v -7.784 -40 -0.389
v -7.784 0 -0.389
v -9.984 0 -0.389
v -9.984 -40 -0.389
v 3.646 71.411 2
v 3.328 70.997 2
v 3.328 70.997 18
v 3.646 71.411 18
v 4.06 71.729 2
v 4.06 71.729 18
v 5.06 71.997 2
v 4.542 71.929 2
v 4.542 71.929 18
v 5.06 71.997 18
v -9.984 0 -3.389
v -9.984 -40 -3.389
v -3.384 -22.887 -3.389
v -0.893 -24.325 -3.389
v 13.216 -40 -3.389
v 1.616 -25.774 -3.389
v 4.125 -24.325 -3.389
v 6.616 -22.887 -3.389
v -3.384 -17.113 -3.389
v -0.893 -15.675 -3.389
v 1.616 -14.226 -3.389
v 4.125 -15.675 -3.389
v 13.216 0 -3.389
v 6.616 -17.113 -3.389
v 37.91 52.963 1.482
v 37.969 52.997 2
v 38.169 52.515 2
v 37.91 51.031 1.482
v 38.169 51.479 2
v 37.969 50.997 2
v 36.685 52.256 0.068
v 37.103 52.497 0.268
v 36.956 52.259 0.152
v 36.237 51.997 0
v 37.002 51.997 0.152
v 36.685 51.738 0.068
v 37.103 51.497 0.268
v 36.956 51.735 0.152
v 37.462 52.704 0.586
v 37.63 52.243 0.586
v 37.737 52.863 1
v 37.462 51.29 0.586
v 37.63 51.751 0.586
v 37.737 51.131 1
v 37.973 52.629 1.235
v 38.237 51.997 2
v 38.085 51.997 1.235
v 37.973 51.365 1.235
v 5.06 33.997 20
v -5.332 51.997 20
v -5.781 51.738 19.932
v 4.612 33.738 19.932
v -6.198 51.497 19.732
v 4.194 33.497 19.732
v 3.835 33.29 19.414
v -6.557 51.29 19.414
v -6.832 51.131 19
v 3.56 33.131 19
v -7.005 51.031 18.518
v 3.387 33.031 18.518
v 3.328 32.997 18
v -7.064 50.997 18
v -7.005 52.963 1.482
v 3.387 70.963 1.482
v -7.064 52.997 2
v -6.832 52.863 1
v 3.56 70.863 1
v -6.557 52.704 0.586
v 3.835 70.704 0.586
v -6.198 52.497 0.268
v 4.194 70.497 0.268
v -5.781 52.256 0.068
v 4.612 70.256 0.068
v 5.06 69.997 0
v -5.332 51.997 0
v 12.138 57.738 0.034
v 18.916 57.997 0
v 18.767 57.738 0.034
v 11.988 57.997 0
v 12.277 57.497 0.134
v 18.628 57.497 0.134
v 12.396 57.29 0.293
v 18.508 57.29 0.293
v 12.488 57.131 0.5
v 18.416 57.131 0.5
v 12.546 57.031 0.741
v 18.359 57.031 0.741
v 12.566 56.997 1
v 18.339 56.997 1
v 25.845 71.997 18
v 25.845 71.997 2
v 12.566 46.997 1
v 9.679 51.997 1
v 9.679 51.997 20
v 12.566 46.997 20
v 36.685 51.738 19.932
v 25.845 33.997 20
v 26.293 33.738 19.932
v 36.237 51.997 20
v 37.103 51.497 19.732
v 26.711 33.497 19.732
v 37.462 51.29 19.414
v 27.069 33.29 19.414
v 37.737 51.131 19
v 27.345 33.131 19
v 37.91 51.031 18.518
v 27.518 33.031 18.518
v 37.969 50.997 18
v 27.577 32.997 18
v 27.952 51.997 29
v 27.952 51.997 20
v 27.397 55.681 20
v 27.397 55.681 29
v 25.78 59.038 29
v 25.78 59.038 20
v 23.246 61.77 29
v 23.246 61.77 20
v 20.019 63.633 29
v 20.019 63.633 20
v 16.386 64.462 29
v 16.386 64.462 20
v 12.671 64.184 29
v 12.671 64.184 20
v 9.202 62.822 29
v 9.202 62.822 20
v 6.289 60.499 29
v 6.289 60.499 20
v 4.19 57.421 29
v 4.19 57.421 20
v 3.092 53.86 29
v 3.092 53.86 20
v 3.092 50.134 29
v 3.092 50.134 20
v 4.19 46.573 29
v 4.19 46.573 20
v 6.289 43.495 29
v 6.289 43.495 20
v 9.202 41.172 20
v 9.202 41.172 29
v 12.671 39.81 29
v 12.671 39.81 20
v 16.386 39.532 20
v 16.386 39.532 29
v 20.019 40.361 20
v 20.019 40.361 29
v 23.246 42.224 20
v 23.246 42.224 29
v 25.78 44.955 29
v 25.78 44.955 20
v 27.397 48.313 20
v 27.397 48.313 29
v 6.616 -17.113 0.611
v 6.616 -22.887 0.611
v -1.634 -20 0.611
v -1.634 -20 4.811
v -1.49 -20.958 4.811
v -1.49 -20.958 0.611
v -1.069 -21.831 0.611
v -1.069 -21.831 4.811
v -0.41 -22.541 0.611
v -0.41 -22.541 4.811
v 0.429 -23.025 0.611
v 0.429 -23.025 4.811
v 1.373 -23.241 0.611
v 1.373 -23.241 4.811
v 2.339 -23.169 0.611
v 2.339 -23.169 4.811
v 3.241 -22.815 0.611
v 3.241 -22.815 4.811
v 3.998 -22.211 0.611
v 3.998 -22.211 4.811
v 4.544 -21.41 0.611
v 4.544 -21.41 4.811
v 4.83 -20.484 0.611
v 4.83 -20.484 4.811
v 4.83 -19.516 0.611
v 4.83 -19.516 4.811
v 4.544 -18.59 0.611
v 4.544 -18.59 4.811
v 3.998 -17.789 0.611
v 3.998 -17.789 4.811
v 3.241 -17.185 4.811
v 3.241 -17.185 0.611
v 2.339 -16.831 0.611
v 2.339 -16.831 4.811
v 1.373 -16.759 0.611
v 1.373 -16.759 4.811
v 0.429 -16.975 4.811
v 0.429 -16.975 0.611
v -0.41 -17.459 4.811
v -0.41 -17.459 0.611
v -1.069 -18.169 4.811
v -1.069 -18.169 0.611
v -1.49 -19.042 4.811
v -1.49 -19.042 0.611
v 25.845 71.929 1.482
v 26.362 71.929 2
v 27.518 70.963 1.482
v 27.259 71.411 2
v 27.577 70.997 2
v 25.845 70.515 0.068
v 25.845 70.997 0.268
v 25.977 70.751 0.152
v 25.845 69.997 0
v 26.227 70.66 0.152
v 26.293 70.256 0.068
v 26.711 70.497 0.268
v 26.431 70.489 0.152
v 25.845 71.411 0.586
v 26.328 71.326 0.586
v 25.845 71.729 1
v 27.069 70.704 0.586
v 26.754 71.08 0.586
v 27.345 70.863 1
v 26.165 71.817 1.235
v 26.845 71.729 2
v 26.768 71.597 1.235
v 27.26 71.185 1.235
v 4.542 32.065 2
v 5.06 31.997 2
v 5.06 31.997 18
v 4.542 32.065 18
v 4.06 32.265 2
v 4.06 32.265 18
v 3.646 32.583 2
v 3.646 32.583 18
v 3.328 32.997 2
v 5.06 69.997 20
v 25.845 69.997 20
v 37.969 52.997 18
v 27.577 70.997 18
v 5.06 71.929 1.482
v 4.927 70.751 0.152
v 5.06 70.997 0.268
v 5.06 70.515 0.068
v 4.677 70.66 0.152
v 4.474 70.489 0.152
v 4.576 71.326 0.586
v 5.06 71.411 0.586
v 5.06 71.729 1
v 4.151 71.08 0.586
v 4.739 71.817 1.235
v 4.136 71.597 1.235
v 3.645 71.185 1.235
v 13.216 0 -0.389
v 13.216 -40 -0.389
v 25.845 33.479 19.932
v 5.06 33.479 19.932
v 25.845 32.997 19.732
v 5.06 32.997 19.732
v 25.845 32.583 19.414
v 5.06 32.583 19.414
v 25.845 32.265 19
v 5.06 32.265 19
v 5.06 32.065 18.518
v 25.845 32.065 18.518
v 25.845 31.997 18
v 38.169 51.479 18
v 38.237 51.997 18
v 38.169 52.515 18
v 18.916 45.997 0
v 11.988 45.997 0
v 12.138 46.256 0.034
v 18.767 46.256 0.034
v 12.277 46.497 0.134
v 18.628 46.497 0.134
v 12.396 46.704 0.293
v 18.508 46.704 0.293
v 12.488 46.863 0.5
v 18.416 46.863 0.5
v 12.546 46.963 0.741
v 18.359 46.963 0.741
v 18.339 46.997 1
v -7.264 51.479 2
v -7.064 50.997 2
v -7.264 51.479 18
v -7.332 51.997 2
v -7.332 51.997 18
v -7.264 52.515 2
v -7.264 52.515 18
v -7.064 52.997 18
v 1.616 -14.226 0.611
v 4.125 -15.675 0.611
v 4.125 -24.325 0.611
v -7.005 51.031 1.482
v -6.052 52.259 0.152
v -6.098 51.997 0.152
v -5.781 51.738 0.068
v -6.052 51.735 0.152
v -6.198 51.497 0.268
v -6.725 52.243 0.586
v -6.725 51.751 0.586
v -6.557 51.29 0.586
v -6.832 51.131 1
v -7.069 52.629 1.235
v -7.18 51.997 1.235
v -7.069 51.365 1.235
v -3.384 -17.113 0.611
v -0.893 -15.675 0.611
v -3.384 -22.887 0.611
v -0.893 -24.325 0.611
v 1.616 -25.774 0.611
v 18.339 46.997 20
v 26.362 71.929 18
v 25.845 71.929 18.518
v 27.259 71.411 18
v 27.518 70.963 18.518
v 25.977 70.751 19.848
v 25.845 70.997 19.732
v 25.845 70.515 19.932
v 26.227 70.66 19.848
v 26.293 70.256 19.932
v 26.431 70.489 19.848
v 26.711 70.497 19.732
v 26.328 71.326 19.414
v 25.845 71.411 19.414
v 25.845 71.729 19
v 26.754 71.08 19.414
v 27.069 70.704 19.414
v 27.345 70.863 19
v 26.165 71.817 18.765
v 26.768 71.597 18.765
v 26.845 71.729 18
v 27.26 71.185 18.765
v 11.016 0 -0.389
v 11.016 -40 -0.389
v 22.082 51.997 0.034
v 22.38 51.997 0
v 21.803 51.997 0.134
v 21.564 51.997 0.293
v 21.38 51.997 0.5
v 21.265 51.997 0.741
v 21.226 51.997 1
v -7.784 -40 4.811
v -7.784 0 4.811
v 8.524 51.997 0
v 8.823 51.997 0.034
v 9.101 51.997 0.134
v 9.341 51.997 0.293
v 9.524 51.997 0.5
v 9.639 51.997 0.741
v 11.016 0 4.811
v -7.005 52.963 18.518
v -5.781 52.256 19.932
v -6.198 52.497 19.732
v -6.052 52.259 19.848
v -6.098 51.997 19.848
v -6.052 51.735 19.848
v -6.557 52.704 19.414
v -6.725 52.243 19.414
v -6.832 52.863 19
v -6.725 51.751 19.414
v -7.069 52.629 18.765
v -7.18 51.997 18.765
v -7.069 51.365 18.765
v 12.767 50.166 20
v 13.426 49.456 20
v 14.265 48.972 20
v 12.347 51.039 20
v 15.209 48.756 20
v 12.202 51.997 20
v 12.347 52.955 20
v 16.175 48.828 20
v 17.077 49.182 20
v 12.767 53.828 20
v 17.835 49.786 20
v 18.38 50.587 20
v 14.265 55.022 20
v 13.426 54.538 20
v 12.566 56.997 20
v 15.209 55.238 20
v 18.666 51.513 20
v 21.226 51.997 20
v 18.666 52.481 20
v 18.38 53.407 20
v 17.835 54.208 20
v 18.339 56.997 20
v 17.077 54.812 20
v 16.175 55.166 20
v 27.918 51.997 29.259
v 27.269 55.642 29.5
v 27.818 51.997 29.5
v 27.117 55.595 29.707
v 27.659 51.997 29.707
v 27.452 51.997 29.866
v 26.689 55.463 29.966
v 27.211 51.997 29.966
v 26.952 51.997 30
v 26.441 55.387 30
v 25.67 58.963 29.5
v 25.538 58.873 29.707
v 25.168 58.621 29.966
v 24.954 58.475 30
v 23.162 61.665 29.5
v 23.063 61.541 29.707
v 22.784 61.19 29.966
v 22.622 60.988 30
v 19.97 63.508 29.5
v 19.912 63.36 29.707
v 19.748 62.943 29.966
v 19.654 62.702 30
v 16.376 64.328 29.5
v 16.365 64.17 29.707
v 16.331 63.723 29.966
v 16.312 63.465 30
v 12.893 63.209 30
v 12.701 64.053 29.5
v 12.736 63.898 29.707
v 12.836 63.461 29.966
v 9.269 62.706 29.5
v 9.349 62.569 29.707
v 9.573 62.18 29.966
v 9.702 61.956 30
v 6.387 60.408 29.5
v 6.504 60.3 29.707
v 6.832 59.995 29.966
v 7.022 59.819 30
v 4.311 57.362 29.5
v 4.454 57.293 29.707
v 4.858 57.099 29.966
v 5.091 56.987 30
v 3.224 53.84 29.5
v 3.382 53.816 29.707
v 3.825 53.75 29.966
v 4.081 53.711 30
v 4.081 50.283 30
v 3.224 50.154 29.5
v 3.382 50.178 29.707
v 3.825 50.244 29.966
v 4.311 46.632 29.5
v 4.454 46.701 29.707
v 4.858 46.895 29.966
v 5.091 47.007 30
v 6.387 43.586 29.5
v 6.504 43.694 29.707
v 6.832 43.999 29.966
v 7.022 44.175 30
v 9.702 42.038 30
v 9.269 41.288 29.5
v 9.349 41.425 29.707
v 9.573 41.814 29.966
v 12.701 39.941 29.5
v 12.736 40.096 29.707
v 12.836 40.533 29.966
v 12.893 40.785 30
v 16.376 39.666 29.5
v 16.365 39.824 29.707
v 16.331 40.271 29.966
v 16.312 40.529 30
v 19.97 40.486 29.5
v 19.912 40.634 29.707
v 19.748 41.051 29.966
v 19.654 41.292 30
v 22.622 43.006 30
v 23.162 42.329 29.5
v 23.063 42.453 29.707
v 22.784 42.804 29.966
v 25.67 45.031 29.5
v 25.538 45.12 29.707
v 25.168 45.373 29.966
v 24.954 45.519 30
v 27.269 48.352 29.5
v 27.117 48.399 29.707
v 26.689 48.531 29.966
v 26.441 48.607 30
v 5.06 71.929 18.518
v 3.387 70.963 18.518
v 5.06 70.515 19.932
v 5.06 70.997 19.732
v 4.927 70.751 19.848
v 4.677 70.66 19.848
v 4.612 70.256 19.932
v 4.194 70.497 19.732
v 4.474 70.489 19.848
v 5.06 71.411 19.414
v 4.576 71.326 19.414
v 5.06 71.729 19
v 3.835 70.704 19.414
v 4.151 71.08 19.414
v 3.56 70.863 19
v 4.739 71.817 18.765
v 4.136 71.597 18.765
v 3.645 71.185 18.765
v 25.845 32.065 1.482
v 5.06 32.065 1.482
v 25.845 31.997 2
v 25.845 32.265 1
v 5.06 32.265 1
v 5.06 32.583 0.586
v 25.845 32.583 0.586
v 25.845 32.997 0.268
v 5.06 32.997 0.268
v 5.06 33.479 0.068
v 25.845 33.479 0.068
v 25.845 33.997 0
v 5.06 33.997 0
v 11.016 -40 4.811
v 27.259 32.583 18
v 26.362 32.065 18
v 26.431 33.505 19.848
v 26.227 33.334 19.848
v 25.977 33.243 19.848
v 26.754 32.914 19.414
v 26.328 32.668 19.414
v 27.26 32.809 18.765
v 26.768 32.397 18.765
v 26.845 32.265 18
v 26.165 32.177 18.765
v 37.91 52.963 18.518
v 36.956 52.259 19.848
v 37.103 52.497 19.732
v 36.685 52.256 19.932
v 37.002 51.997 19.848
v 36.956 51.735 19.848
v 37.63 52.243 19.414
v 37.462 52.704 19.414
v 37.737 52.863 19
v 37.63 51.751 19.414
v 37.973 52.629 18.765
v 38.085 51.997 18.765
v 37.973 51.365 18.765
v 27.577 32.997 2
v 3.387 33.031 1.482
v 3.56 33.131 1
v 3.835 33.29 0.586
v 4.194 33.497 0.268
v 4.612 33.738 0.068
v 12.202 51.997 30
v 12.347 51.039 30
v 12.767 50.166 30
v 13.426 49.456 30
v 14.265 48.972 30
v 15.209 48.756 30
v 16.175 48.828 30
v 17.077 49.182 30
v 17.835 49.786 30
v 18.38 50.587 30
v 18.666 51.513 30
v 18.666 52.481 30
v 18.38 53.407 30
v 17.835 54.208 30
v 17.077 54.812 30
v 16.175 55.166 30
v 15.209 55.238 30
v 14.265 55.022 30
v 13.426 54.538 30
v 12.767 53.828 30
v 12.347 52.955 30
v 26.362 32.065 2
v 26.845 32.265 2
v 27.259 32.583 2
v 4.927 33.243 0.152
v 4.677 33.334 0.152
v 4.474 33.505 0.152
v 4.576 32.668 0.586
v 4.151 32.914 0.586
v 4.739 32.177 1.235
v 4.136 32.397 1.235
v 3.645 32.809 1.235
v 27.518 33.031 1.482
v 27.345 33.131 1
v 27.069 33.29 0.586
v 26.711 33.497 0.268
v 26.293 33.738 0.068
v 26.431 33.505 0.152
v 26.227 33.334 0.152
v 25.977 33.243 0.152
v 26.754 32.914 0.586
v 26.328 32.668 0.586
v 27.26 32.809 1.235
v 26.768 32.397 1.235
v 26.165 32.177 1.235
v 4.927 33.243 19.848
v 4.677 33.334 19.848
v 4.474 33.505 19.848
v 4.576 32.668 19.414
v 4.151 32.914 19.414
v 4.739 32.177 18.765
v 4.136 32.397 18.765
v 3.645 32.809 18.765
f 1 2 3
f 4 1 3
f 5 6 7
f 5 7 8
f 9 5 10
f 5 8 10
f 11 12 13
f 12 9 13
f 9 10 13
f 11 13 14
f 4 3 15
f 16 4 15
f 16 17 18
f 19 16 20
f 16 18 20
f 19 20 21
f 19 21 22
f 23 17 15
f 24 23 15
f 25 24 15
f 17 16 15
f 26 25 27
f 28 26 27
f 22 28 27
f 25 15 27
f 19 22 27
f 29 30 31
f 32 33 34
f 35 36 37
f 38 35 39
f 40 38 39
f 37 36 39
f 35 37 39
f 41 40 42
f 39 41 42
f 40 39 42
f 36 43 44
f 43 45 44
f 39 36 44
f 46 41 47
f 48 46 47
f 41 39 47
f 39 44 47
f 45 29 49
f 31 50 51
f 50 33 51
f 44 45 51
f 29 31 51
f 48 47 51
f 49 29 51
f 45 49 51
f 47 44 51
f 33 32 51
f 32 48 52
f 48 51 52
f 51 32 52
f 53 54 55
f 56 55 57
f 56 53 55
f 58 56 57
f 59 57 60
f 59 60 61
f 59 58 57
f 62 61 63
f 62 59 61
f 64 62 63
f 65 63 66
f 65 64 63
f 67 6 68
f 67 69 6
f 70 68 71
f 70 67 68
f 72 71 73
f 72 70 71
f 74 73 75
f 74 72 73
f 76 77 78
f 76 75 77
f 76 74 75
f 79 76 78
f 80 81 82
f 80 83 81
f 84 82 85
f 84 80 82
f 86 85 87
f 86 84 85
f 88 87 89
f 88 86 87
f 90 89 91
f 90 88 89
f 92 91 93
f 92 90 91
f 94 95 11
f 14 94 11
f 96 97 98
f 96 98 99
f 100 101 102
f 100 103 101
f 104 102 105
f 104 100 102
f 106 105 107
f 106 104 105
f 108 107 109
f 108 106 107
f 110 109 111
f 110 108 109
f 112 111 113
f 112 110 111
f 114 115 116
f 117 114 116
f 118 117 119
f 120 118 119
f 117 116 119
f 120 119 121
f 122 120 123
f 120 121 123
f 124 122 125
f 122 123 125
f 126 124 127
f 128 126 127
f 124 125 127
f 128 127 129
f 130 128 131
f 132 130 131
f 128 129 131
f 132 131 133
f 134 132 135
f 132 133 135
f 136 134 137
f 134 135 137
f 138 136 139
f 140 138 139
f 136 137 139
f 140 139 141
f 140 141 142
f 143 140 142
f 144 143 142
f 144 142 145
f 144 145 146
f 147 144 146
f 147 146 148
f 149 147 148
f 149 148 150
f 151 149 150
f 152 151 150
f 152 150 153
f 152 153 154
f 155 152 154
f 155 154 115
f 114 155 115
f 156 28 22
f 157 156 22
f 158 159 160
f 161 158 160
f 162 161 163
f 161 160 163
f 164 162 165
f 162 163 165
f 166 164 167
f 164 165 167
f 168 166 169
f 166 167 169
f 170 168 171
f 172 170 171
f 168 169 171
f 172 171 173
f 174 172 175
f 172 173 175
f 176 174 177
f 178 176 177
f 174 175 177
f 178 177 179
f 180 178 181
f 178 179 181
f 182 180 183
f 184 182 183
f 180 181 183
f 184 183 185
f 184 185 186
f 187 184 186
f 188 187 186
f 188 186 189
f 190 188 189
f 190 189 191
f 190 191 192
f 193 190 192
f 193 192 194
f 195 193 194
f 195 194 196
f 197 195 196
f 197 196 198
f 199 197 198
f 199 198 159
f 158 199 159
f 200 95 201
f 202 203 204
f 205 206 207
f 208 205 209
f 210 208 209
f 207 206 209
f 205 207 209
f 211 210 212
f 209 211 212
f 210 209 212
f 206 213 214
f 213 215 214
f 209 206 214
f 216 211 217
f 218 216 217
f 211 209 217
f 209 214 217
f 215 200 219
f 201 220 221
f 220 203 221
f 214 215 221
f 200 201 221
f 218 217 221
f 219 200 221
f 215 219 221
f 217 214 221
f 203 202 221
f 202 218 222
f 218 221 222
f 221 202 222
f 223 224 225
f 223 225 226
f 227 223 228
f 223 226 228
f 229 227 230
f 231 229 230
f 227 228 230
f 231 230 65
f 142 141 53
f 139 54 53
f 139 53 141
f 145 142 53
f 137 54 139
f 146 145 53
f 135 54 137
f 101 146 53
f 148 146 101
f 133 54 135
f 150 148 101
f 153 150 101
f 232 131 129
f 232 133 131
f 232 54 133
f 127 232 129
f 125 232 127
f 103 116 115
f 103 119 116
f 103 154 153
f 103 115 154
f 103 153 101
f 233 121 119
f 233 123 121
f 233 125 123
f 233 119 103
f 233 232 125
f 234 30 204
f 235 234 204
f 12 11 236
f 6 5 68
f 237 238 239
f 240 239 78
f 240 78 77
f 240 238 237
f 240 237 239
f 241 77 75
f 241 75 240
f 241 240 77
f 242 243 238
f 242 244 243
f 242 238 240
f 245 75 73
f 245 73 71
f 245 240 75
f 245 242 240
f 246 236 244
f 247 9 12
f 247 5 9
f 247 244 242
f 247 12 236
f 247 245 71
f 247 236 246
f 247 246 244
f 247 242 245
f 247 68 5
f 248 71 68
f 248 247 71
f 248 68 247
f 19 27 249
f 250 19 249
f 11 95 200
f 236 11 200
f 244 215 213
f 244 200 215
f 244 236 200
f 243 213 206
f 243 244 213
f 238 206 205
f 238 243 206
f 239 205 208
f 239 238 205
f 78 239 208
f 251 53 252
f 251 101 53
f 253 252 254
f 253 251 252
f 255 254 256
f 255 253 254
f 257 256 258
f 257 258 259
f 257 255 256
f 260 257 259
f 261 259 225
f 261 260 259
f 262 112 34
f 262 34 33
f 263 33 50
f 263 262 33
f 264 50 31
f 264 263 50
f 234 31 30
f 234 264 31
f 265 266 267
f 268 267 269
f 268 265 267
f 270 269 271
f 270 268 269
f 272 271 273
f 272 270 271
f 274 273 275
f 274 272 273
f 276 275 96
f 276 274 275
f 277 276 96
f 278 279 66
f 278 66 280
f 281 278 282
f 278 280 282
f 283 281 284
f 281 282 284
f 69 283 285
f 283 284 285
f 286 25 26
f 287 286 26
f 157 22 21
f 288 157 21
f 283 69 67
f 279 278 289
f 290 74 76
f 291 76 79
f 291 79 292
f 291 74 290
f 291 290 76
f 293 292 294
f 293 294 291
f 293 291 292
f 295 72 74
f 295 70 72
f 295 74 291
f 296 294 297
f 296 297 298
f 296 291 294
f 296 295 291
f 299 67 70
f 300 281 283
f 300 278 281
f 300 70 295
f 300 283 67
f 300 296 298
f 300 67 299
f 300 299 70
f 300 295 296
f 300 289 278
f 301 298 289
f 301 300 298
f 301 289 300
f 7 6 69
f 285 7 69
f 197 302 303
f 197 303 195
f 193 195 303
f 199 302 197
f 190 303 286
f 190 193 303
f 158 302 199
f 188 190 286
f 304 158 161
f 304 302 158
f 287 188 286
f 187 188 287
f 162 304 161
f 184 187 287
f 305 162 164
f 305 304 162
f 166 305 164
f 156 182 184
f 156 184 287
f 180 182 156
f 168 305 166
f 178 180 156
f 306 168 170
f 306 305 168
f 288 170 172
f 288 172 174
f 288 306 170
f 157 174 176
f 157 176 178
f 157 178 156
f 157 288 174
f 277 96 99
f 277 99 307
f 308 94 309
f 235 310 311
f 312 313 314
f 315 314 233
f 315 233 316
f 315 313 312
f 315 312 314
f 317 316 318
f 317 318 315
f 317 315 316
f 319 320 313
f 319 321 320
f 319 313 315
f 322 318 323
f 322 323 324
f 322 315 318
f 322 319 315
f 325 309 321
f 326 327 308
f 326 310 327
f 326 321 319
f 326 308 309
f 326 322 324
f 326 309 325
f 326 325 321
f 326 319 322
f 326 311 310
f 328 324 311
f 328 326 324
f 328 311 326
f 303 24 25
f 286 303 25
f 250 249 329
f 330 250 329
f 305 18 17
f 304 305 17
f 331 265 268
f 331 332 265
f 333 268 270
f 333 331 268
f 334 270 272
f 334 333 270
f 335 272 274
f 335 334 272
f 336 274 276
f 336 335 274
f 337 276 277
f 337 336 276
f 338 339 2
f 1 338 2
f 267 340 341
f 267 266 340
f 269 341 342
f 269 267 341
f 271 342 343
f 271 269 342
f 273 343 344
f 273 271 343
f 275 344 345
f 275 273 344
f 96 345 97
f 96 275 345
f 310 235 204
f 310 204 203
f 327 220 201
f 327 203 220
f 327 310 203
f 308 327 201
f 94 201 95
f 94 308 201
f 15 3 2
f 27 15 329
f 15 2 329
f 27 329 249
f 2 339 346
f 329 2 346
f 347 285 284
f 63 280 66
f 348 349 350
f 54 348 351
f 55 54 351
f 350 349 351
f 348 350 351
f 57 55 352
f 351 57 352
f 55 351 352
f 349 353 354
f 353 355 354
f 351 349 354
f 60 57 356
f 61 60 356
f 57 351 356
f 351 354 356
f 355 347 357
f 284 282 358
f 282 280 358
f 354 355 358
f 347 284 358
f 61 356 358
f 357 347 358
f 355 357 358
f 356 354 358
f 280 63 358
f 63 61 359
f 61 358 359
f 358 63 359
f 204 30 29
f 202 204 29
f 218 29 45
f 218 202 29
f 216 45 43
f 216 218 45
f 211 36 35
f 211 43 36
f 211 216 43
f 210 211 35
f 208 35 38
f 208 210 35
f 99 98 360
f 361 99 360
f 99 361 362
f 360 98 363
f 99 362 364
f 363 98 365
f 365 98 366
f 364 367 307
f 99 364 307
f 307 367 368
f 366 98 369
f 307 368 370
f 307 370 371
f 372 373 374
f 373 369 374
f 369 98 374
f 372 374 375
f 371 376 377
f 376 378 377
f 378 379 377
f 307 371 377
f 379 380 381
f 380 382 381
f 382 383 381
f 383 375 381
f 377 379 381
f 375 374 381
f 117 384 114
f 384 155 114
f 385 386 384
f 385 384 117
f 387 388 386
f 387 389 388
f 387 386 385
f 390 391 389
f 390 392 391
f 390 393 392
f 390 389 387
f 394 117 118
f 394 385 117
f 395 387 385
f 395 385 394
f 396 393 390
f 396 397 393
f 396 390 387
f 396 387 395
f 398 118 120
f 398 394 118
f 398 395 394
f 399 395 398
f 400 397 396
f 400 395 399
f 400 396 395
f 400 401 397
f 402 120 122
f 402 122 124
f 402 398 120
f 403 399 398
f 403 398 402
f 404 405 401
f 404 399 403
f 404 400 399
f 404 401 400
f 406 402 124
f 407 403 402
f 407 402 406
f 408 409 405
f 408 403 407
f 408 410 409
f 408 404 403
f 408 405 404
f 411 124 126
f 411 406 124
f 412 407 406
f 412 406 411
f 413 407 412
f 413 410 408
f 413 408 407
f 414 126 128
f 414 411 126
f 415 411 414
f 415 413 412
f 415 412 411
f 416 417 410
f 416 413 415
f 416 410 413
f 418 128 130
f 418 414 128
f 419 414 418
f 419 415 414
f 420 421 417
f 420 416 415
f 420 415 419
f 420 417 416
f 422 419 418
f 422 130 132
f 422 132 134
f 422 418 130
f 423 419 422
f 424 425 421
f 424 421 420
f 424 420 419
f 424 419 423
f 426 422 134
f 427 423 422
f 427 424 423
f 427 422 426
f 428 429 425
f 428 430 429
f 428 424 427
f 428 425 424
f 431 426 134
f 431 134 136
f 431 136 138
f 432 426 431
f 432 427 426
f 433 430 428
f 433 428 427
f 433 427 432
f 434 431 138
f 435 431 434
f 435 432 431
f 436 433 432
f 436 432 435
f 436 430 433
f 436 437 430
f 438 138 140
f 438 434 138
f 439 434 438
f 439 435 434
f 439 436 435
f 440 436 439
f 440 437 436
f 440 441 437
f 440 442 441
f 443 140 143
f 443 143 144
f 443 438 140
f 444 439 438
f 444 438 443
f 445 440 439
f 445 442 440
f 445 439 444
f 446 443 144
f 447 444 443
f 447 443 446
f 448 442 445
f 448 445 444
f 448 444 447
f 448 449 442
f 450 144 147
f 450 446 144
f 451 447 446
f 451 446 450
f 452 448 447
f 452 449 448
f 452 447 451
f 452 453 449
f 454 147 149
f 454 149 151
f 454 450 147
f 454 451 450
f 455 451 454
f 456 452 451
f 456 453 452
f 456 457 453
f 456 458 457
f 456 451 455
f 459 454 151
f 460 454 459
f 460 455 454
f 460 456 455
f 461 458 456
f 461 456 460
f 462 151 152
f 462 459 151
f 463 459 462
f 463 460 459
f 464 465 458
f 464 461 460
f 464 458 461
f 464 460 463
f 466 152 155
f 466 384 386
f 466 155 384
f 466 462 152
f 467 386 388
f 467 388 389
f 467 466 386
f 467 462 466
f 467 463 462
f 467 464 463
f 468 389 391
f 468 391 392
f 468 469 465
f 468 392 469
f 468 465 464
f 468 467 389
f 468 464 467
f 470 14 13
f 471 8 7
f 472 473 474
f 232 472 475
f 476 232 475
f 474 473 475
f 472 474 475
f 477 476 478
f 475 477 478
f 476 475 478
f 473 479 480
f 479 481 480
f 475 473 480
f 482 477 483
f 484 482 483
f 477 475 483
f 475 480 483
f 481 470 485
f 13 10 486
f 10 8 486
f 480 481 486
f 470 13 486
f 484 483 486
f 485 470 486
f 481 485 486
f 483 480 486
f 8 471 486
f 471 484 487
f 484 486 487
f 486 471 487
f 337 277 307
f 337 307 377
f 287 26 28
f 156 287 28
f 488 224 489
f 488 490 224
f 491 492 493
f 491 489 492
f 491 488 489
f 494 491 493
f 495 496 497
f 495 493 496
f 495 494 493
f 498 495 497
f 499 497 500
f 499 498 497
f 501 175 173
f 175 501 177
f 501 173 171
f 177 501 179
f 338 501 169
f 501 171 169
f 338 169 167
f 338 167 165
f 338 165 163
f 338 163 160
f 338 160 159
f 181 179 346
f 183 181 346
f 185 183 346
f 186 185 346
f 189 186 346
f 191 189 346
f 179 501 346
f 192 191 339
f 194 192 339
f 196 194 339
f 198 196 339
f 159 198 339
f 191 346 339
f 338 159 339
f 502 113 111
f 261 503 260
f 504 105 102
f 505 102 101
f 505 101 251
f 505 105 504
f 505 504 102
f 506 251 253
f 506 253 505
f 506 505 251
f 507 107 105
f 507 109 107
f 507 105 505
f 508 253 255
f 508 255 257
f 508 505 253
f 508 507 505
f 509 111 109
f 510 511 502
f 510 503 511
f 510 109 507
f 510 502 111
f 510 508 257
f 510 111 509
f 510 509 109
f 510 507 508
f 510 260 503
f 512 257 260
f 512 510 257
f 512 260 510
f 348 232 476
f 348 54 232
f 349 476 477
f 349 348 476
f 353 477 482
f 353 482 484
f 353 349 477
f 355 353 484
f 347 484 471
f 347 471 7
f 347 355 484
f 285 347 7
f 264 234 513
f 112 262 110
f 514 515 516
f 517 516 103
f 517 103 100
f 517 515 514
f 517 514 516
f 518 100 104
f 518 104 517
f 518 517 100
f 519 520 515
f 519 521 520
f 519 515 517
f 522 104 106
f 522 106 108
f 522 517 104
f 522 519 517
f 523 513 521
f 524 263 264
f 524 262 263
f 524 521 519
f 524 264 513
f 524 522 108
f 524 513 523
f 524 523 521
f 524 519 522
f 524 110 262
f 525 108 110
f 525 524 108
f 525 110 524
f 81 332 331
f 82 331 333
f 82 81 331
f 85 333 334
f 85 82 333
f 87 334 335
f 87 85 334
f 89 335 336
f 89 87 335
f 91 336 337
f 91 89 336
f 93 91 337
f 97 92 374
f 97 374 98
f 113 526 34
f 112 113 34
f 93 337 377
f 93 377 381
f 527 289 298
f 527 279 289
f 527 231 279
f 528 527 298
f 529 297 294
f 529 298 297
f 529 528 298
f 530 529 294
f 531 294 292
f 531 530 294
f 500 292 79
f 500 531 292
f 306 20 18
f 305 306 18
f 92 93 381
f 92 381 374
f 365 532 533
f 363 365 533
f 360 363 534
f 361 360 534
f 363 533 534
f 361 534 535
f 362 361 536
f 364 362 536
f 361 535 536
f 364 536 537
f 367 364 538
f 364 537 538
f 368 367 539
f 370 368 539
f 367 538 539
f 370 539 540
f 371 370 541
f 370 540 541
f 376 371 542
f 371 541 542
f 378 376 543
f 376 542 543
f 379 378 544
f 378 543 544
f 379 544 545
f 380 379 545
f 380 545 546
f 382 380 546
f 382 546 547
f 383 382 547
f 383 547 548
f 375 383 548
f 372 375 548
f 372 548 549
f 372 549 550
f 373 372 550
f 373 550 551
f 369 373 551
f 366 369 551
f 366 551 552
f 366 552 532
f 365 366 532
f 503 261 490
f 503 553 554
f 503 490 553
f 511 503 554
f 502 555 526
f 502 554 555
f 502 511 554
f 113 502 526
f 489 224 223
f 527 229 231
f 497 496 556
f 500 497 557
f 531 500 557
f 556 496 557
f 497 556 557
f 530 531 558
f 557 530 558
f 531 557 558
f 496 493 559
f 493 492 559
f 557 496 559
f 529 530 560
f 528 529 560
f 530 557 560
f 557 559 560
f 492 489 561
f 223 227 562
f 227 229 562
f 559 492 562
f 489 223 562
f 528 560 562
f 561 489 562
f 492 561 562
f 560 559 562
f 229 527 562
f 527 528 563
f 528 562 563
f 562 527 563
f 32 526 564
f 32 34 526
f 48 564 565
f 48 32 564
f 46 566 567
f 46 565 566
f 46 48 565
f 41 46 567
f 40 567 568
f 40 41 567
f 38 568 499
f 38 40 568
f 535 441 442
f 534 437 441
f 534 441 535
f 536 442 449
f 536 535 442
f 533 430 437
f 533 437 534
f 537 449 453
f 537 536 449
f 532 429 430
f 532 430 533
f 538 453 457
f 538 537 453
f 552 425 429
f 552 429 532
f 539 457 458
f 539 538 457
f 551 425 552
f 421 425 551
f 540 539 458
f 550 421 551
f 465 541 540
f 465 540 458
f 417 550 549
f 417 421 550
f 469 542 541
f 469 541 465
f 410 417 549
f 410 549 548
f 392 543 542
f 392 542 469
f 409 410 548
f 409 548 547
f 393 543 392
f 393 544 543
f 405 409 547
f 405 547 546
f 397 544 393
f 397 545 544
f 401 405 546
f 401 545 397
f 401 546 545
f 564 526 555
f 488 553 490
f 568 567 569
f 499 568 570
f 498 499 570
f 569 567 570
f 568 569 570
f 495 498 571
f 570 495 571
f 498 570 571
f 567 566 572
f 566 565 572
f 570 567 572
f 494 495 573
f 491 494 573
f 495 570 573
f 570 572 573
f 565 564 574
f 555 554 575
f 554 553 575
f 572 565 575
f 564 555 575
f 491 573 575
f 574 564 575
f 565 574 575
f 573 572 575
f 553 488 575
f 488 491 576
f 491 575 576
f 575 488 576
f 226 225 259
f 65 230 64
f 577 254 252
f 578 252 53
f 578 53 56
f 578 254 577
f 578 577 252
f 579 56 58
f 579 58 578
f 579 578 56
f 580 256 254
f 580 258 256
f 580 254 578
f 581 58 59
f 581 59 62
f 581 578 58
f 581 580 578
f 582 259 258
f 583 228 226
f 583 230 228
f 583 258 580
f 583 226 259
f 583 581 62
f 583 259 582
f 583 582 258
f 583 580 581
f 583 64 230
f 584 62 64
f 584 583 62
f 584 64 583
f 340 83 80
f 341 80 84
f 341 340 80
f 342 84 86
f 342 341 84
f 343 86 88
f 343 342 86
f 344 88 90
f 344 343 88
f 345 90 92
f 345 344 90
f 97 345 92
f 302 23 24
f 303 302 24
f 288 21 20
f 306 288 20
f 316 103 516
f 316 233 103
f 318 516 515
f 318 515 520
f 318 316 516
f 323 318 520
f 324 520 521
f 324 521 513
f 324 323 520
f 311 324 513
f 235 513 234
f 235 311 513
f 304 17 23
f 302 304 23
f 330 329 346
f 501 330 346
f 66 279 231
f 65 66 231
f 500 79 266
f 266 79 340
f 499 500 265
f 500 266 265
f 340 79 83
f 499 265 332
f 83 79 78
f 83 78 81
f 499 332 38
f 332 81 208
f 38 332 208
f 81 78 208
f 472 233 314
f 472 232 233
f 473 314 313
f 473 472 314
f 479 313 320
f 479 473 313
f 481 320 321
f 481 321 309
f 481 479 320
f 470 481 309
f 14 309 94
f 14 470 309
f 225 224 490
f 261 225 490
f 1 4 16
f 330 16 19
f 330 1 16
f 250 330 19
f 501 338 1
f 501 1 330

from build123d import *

# Parameters (mm, degrees)
F1_DEPTH = 40
F3_DEPTH = 4
F4_D     = 6.5
F5_R     = 12.5
F6_DEPTH = 20
F7_DEPTH = 30
F8_DEPTH = 20
F9_D     = 6.5
F10_R    = 2
F11_R    = 1


with BuildPart() as f1:
    # F0 (on Front) → F1 (new body)
    with BuildSketch(Plane.XZ):
        Polygon((-9.9840804588, -0.389425854), (-9.9840804588, -3.389425854), (13.2159195412, -3.389425854), (13.2159195412, -0.389425854), (11.0159195412, -0.389425854), (11.0159195412, 4.810574146), (-7.7840804588, 4.810574146), (-7.7840804588, -0.389425854), align=None)
    extrude(amount=F1_DEPTH)

    # F2 (on face) → F3 (cut)
    with BuildSketch(Plane(origin=(0, 0, -3.389425854), x_dir=(1, 0, 0), z_dir=(0, 0, -1))):
        Polygon((4.1245149324, 24.3251644675), (1.6159195412, 20), (4.1245149324, 15.6748355325), (6.6159195412, 17.1132486541), (6.6159195412, 22.8867513459), align=None)
        Polygon((1.6159195412, 25.7735026919), (-0.89267585, 24.3251644675), (1.6159195412, 20), (4.1245149324, 24.3251644675), align=None)
        Polygon((1.6159195412, 20), (-0.89267585, 24.3251644675), (-3.3840804588, 22.8867513459), (-3.3840804588, 17.1132486541), (-0.89267585, 15.6748355325), align=None)
        Polygon((4.1245149324, 15.6748355325), (1.6159195412, 20), (-0.89267585, 15.6748355325), (1.6159195412, 14.2264973081), align=None)
    extrude(amount=-F3_DEPTH, mode=Mode.SUBTRACT)

    # F4 (through all)
    with Locations(Plane(origin=(0, 0, -3.389425854), x_dir=(1, 0, 0), z_dir=(0, 0, -1))):
        with Locations((1.6159195412, 20)):
            Hole(F4_D / 2)


with BuildPart() as f6:
    # F5 (on Top) → F6 (new body)
    with BuildSketch(Plane.XY):
        Polygon((3.9052696689, 31.9969910383), (26.9992804365, 31.9969910383), (38.5462858203, 51.9969910383), (26.9992804365, 71.9969910383), (3.9052696689, 71.9969910383), (-7.6417357149, 51.9969910383), align=None)
        with Locations((15.4522750527, 51.9969910383)):
            Circle(F5_R, mode=Mode.SUBTRACT)
    extrude(amount=F6_DEPTH)

    # F5 (on Top) → F7 (join)
    with BuildSketch(Plane.XY):
        with Locations((15.4522750527, 51.9969910383)):
            Circle(F5_R)
        Polygon((21.2257777446, 51.9969910383), (18.3390263986, 46.9969910383), (12.5655237067, 46.9969910383), (9.6787723608, 51.9969910383), (12.5655237067, 56.9969910383), (18.3390263986, 56.9969910383), align=None, mode=Mode.SUBTRACT)
        Polygon((12.5655237067, 46.9969910383), (18.3390263986, 46.9969910383), (21.2257777446, 51.9969910383), (18.3390263986, 56.9969910383), (12.5655237067, 56.9969910383), (9.6787723608, 51.9969910383), align=None)
    extrude(amount=F7_DEPTH)

    # F5 (on Top) → F8 (cut)
    with BuildSketch(Plane.XY):
        Polygon((12.5655237067, 46.9969910383), (18.3390263986, 46.9969910383), (21.2257777446, 51.9969910383), (18.3390263986, 56.9969910383), (12.5655237067, 56.9969910383), (9.6787723608, 51.9969910383), align=None)
    extrude(amount=F8_DEPTH, mode=Mode.SUBTRACT)

    # F9 (through all)
    with Locations(Plane(origin=(0, 0, 0), x_dir=(1, 0, 0), z_dir=(0, 0, -1))):
        with Locations((15.4522750527, -51.9969910383)):
            Hole(F9_D / 2)

    # F10
    f10_edges = [f6.edges().sort_by_distance(p)[0] for p in [
        (3.90527, 71.996991, 10),
        (26.99928, 71.996991, 10),
        (15.452275, 71.996991, 0),
        (15.452275, 71.996991, 20),
        (38.546286, 51.996991, 10),
        (32.772783, 61.996991, 0),
        (32.772783, 61.996991, 20),
        (-7.641736, 51.996991, 10),
        (-1.868233, 61.996991, 0),
        (-1.868233, 61.996991, 20),
        (26.99928, 31.996991, 10),
        (32.772783, 41.996991, 0),
        (32.772783, 41.996991, 20),
        (3.90527, 31.996991, 10),
        (15.452275, 31.996991, 0),
        (15.452275, 31.996991, 20),
        (-1.868233, 41.996991, 0),
        (-1.868233, 41.996991, 20),
    ]]
    fillet(f10_edges, radius=F10_R)

    # F11
    f11_edges = [f6.edges().sort_by_distance(p)[0] for p in [
        (2.952275, 51.996991, 30),
        (15.452275, 46.996991, 0),
        (11.122148, 49.496991, 0),
        (11.122148, 54.496991, 0),
        (15.452275, 56.996991, 0),
        (19.782402, 54.496991, 0),
        (19.782402, 49.496991, 0),
    ]]
    fillet(f11_edges, radius=F11_R)


solid = Compound([f1.part, f6.part])
